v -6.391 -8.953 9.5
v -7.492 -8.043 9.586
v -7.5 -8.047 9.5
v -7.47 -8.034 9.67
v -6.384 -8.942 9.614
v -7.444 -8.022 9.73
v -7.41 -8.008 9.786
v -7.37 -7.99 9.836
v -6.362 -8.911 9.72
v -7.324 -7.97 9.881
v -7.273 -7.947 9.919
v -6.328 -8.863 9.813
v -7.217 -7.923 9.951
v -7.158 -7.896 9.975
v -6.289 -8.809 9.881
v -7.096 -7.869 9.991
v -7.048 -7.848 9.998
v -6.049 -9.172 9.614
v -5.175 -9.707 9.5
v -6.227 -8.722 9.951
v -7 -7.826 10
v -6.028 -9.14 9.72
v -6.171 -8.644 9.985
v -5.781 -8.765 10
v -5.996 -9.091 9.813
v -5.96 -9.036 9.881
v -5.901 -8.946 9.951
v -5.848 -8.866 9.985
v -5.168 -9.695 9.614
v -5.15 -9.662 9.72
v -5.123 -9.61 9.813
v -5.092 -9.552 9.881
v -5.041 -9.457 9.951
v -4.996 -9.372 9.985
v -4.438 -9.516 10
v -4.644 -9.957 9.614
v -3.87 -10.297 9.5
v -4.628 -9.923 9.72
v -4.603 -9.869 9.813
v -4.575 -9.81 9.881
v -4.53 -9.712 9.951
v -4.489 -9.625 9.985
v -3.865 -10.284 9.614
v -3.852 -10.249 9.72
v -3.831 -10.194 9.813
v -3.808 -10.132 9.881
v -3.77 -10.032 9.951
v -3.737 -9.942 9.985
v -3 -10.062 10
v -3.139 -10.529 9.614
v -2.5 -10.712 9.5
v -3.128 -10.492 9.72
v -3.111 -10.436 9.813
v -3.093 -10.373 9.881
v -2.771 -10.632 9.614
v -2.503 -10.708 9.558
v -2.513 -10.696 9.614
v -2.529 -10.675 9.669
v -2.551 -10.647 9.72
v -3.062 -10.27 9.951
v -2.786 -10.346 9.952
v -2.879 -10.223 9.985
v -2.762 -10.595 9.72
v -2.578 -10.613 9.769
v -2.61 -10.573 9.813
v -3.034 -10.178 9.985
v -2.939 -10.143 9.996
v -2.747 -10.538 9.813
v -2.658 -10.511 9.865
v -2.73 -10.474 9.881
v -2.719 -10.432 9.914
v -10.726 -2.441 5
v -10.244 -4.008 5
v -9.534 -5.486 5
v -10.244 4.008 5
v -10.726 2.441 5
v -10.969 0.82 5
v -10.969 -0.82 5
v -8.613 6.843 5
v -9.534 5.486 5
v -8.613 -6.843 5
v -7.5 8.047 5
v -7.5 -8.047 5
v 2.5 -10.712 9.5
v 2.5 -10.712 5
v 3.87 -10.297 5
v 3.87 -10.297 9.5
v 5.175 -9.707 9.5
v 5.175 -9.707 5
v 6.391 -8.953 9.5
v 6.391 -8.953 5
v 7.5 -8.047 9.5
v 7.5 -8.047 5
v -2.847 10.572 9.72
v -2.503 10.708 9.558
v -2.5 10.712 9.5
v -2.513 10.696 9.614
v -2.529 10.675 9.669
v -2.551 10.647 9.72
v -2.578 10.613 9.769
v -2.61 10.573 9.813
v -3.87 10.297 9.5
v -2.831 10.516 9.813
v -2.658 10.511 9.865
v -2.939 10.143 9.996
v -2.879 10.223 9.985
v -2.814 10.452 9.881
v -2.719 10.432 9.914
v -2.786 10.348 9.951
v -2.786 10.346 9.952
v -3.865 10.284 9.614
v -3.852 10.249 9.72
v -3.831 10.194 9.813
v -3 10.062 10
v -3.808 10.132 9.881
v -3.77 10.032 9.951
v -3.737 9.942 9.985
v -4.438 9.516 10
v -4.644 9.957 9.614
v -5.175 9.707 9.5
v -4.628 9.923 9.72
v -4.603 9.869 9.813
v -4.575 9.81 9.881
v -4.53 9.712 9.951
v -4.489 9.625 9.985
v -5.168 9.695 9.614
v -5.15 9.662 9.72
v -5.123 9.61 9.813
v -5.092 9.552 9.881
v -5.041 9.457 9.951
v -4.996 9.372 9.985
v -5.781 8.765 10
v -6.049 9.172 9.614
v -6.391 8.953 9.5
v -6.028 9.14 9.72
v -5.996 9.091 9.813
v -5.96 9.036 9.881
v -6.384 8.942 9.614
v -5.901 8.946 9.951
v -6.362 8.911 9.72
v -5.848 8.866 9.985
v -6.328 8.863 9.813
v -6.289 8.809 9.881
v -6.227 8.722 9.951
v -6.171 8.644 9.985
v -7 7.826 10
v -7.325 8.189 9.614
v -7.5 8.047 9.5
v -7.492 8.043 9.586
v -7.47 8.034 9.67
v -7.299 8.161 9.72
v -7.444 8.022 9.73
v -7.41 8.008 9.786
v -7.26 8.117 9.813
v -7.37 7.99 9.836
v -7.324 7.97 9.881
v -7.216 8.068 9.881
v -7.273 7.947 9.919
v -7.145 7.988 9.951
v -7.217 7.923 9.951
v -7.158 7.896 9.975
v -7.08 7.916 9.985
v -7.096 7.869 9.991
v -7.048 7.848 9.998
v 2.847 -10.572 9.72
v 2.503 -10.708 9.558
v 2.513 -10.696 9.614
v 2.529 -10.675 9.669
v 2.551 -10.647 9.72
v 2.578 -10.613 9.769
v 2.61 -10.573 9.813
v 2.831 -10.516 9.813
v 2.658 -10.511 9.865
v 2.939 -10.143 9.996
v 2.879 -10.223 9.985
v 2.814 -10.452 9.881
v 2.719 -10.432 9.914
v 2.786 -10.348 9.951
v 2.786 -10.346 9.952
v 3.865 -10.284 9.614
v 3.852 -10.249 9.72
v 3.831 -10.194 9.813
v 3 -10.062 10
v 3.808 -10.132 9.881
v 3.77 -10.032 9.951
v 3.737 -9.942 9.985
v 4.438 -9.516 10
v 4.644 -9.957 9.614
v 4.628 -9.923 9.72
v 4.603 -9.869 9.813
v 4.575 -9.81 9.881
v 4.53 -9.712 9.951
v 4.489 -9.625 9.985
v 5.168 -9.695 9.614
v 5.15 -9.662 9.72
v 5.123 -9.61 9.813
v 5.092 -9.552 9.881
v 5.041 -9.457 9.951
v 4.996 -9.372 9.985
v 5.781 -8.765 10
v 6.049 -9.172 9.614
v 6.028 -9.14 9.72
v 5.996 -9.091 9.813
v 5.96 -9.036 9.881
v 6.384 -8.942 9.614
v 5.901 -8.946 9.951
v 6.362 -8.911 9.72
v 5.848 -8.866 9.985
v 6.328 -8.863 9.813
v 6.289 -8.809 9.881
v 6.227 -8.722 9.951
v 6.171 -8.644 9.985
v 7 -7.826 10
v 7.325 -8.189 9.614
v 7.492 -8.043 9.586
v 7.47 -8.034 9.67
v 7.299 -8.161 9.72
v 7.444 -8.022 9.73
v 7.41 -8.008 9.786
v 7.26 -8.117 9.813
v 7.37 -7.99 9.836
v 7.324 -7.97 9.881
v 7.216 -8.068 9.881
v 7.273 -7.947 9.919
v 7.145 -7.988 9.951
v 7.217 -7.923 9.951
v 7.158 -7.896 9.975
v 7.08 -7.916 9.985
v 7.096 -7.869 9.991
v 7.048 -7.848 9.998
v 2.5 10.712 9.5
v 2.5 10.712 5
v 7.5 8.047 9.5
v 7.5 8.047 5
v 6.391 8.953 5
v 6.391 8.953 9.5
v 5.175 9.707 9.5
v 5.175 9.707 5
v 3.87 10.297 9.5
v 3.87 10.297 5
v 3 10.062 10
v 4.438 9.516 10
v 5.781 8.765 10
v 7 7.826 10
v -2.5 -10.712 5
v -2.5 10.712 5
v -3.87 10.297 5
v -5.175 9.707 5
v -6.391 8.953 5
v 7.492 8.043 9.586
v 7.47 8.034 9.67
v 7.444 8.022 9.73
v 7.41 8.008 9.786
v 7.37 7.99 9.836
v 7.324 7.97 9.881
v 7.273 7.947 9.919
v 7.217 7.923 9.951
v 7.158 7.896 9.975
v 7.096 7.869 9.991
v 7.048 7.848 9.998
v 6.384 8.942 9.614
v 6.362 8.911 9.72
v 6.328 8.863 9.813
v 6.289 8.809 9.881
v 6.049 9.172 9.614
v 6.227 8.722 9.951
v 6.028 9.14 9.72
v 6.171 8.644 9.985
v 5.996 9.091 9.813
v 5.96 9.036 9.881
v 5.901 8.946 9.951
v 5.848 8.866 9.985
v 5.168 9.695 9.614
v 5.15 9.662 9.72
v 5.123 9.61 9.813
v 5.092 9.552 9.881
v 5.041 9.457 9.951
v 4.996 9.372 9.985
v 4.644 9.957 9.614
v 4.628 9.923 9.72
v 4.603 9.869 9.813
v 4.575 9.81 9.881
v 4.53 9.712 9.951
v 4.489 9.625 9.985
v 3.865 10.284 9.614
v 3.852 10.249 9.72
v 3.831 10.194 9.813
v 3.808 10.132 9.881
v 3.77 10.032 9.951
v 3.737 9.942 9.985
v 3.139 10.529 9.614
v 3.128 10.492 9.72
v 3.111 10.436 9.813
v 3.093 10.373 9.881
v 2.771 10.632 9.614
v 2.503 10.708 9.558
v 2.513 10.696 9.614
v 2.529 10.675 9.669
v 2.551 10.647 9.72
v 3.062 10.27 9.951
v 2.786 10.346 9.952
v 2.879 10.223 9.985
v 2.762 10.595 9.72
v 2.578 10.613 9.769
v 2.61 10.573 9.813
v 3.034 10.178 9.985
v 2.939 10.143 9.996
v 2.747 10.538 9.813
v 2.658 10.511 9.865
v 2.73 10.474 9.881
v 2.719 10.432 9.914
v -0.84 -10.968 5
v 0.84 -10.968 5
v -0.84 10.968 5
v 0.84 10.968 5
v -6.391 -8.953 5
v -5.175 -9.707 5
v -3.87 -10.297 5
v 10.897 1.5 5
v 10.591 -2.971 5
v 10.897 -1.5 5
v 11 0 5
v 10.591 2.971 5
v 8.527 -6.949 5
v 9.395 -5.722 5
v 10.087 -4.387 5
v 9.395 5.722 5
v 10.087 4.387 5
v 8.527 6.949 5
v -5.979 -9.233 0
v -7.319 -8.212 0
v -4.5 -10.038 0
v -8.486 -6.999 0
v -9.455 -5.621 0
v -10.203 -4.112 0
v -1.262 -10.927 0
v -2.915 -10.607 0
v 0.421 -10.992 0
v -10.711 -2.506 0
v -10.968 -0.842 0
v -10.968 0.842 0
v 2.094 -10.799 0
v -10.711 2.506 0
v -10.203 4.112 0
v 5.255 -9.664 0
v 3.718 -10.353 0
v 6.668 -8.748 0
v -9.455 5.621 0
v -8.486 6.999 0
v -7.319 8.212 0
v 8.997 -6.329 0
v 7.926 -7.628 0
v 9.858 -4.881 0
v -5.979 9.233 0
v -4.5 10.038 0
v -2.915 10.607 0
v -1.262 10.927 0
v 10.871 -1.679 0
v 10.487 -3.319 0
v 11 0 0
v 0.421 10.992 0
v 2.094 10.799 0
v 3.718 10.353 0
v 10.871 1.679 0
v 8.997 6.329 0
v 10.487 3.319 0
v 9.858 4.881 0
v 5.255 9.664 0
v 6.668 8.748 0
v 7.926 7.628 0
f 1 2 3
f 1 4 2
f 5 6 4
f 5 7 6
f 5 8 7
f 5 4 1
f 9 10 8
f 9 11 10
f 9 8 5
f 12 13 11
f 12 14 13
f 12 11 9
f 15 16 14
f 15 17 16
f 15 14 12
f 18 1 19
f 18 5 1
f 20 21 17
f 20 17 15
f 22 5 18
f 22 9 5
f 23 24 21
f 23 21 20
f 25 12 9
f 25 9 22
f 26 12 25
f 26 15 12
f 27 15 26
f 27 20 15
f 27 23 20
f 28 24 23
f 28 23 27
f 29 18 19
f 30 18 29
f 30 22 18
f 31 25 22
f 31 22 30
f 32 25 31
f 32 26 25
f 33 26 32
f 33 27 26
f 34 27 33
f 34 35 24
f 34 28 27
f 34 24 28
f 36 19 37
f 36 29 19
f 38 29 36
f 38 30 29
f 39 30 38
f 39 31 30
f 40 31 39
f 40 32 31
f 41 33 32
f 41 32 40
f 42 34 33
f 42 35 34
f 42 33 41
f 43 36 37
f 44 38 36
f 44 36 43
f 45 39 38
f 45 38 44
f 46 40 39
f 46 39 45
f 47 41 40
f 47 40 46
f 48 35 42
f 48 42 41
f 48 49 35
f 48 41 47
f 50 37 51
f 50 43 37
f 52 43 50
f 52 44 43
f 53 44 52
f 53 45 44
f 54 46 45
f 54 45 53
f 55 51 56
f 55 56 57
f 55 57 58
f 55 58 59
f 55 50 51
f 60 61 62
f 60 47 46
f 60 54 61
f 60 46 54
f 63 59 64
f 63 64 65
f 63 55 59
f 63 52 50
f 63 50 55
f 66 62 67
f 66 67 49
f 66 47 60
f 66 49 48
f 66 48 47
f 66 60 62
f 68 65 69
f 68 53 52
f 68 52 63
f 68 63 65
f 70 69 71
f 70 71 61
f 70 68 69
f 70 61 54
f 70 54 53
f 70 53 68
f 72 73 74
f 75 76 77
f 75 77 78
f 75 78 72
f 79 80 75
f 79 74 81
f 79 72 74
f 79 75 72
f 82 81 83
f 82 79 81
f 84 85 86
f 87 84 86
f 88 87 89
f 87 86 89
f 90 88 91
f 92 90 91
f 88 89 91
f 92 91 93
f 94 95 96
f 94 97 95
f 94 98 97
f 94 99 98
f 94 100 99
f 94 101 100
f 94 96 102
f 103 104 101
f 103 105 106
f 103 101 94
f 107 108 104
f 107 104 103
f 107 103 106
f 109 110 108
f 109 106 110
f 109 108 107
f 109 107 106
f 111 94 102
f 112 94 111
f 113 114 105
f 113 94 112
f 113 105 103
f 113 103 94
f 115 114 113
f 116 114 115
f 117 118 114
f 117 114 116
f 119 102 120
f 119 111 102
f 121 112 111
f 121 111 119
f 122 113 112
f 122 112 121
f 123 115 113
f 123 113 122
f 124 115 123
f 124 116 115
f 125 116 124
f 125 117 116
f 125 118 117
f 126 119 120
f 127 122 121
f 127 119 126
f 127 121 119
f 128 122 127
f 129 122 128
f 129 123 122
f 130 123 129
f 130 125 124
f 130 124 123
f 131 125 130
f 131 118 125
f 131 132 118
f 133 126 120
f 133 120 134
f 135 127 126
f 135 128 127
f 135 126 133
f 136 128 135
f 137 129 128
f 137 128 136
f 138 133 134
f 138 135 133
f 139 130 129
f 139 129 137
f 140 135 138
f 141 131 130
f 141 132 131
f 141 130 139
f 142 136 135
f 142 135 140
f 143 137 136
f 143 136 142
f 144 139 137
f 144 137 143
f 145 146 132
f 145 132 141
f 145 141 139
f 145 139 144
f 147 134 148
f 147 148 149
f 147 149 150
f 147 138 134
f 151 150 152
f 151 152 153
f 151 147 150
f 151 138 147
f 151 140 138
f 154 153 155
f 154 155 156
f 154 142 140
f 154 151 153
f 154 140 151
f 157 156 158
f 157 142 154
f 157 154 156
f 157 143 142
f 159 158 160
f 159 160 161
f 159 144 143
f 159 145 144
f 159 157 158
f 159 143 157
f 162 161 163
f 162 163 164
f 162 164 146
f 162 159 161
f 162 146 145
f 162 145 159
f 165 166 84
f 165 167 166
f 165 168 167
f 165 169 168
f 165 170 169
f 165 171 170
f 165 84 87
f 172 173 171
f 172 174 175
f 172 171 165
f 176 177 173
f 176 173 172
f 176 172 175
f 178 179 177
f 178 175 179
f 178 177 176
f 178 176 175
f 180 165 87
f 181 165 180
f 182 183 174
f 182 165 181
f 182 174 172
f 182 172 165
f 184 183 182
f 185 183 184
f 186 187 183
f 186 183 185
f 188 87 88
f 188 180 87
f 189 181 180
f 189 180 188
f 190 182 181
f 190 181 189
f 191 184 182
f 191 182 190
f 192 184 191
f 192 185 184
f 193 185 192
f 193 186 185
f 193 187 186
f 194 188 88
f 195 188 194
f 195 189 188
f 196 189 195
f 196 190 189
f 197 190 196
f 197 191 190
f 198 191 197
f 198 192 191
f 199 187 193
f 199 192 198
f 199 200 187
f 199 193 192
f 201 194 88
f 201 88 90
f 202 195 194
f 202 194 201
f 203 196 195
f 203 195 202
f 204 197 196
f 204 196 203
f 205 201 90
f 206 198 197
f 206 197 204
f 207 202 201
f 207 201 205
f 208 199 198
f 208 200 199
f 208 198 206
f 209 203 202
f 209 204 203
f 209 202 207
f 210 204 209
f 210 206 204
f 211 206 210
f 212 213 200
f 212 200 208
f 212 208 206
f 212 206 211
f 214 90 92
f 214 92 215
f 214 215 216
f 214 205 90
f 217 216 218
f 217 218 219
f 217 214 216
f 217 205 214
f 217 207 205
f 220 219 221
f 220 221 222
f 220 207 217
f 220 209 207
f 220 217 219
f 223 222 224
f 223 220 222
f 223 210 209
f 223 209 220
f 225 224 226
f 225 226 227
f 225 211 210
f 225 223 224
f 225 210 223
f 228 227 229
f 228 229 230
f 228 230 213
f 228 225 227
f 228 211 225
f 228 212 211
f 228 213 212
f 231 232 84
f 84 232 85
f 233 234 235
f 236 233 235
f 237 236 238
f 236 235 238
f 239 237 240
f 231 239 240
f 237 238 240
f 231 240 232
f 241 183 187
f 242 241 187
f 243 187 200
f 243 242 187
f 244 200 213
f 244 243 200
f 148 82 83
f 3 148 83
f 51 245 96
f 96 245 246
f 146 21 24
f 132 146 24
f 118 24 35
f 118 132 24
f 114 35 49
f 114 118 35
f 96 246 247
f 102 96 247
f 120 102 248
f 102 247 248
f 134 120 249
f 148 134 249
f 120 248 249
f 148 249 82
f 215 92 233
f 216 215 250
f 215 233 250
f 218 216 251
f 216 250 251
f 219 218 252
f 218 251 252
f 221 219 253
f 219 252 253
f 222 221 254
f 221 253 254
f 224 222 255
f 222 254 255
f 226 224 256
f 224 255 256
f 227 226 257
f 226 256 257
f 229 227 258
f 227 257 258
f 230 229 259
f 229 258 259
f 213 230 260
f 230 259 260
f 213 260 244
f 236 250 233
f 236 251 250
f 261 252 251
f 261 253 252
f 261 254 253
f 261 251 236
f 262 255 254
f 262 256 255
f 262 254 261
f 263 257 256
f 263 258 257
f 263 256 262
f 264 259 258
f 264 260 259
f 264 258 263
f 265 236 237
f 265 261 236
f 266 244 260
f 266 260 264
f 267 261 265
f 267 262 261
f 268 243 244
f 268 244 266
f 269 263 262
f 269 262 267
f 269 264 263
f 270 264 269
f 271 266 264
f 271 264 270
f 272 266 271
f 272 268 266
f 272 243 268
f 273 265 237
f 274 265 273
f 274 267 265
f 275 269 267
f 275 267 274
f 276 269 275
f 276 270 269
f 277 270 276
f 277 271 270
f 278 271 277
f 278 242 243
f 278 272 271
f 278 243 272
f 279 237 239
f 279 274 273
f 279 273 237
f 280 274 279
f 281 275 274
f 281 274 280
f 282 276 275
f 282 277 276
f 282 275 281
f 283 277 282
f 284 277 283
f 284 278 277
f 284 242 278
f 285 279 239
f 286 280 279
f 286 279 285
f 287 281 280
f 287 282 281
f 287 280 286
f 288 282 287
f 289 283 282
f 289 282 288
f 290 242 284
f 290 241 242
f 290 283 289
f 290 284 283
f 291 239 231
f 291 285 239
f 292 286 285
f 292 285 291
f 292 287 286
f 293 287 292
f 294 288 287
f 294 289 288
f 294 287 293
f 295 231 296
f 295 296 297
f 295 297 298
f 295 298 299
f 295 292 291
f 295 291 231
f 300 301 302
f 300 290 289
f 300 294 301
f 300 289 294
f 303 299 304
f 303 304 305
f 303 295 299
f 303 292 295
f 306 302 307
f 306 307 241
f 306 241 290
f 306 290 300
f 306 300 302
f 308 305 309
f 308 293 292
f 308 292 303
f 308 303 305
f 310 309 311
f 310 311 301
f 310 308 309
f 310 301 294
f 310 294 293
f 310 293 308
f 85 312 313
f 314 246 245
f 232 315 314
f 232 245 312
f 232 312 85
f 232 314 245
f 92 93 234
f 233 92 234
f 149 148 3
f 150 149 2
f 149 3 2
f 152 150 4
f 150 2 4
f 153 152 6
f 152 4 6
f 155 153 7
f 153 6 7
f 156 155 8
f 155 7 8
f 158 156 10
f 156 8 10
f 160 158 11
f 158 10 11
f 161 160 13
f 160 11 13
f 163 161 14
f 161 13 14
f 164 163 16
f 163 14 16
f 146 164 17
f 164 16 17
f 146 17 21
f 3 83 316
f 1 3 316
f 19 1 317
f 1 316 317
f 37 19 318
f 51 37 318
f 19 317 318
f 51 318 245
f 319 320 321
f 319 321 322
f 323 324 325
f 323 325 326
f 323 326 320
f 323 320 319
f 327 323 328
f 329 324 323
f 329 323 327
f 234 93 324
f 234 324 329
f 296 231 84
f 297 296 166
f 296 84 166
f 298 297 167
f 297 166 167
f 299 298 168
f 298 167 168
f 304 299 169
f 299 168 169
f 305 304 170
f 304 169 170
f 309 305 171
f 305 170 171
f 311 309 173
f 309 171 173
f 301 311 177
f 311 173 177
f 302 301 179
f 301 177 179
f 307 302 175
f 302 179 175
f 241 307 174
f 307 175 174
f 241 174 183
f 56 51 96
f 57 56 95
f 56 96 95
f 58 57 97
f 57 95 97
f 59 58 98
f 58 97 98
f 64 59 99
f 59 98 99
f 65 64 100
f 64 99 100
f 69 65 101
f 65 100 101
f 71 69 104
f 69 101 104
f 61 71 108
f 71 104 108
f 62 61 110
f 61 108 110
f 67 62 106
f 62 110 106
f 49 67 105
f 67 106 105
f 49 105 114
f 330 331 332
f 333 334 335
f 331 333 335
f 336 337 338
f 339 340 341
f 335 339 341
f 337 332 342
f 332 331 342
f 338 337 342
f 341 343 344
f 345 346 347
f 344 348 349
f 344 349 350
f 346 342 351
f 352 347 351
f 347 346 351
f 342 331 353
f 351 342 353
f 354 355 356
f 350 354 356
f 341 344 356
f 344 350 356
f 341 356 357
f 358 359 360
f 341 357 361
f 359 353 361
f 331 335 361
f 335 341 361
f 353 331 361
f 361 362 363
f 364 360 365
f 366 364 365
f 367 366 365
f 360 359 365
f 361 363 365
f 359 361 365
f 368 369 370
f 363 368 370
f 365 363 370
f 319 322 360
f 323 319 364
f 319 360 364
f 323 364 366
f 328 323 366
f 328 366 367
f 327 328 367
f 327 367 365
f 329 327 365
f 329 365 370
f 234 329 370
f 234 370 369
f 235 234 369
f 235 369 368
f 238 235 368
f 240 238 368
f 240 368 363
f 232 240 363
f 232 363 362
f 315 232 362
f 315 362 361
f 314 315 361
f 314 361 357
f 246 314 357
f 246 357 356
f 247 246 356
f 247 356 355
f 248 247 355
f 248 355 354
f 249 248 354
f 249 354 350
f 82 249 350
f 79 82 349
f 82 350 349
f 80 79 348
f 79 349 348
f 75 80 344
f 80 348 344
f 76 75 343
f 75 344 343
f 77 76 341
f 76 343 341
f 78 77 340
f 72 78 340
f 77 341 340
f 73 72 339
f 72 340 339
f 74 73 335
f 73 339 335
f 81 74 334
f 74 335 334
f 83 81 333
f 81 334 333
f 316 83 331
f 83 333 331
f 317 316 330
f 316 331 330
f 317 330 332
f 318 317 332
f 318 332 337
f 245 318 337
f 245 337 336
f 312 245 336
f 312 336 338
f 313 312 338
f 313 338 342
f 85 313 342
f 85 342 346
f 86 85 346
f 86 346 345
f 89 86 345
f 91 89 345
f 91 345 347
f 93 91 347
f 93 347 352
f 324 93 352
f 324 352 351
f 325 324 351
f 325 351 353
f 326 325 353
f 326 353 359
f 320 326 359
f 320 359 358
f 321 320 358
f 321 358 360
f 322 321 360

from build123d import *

# Parameters (mm, degrees)
ESQUISSE1_R        = 11
BOSS_EXTRU_1_DEPTH = 5
BOSS_EXTRU_3_DEPTH = 5
CONG_3_R           = 0.5


with BuildPart() as part:
    # Esquisse1 → Boss.-Extru.1 (new body)
    with BuildSketch(Plane.XY):
        Circle(ESQUISSE1_R)
    extrude(amount=BOSS_EXTRU_1_DEPTH)

    # Esquisse2 → Boss.-Extru.3 (add)
    with BuildSketch(Plane.XY.offset(5)):
        with BuildLine():
            ThreePointArc((-2.5, 10.712142643), (-5.174562286, 9.706899873), (-7.5, 8.04673847))
            Line((-7.5, 8.04673847), (-7.5, -8.04673847))
            ThreePointArc((-7.5, -8.04673847), (-5.174562286, -9.706899873), (-2.5, -10.712142643))
            Line((-2.5, -10.712142643), (-2.5, 10.712142643))
        make_face()
        with BuildLine():
            ThreePointArc((7.5, 8.04673847), (5.174562286, 9.706899873), (2.5, 10.712142643))
            Line((2.5, 10.712142643), (2.5, -10.712142643))
            ThreePointArc((2.5, -10.712142643), (5.174562286, -9.706899873), (7.5, -8.04673847))
            Line((7.5, -8.04673847), (7.5, 8.04673847))
        make_face()
    extrude(amount=BOSS_EXTRU_3_DEPTH)

    # Congé3
    cong_3_edges = [part.edges().sort_by_distance(p)[0] for p in [
        (5.174562286, 9.706899873, 10),
        (5.174562286, -9.706899873, 10),
        (7.5, 0, 10),
        (2.5, 0, 10),
        (-5.174562286, 9.706899873, 10),
        (-5.174562286, -9.706899873, 10),
        (-2.5, 0, 10),
        (-7.5, 0, 10),
    ]]
    fillet(cong_3_edges, radius=CONG_3_R)


solid = part.part
